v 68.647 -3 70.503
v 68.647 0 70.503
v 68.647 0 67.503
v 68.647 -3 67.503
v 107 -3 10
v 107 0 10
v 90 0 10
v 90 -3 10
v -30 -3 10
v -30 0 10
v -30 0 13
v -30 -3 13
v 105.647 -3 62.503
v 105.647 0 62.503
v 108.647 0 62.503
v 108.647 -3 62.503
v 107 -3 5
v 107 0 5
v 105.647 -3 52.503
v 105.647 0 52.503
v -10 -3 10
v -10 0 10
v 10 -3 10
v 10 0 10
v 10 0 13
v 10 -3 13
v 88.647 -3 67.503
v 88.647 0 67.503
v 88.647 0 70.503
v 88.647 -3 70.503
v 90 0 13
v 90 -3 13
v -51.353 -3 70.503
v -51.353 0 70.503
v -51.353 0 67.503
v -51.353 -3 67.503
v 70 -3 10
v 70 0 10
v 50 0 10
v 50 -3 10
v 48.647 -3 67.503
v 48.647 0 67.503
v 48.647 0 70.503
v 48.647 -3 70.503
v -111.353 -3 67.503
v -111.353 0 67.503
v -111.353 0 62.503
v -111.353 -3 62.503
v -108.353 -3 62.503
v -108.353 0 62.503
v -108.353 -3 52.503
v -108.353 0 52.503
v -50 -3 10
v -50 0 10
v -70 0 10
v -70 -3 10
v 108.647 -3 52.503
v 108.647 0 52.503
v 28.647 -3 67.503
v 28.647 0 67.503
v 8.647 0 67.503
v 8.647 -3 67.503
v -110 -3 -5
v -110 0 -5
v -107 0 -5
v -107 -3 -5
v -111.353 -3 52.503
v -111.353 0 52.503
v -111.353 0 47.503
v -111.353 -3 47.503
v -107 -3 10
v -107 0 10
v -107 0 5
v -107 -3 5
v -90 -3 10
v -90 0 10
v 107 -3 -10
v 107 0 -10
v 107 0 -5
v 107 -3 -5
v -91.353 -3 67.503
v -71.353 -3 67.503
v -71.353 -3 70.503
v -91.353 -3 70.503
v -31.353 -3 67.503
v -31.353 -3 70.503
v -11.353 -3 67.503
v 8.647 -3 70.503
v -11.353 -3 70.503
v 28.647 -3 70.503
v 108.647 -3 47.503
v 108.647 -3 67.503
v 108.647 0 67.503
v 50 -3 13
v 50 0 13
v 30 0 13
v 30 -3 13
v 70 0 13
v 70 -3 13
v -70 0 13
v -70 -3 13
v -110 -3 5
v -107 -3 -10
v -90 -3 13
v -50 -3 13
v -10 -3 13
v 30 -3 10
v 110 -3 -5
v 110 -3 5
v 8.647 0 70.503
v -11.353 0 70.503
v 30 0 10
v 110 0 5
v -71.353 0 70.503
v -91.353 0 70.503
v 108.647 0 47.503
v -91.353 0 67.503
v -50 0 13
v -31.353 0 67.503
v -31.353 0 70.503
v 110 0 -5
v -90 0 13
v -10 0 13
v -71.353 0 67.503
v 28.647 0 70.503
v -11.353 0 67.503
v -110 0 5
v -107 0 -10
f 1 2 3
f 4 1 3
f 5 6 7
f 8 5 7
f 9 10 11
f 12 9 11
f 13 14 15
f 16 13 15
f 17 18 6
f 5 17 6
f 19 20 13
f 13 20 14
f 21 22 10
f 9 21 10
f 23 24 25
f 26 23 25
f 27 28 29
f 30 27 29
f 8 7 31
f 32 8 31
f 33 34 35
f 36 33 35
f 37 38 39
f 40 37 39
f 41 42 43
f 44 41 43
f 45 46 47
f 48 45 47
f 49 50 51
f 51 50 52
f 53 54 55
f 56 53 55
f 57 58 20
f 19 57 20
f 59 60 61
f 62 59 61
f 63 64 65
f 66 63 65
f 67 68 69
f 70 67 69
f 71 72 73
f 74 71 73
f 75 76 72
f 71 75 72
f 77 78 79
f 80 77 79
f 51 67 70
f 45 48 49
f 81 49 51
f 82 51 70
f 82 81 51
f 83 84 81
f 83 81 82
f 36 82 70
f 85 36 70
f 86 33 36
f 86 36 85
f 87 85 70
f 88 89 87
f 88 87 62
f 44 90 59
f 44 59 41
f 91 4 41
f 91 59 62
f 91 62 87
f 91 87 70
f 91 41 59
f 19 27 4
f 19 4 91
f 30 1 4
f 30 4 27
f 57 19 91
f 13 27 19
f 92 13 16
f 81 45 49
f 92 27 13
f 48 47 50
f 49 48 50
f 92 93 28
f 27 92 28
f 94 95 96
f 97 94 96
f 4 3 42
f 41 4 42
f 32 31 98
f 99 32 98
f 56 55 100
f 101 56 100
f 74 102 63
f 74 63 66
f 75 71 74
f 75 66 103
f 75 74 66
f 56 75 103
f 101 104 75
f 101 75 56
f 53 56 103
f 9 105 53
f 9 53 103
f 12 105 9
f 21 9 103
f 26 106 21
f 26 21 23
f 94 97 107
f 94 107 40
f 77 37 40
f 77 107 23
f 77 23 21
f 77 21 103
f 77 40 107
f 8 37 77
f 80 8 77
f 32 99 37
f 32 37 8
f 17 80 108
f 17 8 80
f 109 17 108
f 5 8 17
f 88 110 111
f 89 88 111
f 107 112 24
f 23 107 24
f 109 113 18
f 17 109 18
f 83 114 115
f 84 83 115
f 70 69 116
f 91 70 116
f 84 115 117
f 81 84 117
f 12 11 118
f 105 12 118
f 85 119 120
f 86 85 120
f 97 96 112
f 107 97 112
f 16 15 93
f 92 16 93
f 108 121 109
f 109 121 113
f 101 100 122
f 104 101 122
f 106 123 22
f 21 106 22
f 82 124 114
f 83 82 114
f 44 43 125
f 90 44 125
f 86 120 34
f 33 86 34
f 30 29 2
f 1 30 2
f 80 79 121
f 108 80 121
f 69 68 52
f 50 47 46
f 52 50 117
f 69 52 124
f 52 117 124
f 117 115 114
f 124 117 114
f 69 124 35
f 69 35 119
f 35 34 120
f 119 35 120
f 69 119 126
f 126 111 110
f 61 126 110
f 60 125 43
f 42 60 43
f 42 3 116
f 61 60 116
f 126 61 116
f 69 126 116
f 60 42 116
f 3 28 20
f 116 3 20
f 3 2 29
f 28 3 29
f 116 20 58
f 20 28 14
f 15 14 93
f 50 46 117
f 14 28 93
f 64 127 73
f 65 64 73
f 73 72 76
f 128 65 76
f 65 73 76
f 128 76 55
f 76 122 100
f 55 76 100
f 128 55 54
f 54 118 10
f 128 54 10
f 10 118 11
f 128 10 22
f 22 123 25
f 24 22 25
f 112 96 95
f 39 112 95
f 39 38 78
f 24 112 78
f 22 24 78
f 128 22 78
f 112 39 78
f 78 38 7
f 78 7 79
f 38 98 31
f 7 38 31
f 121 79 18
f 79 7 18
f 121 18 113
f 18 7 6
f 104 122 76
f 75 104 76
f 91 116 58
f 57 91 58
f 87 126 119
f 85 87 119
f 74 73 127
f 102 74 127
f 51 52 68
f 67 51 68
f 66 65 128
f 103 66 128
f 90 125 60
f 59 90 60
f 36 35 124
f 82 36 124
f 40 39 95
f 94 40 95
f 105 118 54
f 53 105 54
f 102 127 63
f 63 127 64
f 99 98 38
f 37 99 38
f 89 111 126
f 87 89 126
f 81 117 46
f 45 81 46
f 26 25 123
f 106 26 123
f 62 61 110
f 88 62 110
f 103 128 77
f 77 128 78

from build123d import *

# Parameters (mm, degrees)
F1_DEPTH = 3


with BuildPart() as f1:
    # F0 (on Front) → F1 (new body)
    with BuildSketch(Plane.XZ):
        Polygon((-91.353428, 67.502585), (-111.353428, 67.502585), (-111.353428, 62.502585), (-108.353428, 62.502585), (-108.353428, 52.502585), (-111.353428, 52.502585), (-111.353428, 47.502585), (108.646572, 47.502585), (108.646572, 52.502585), (105.646572, 52.502585), (105.646572, 62.502585), (108.646572, 62.502585), (108.646572, 67.502585), (88.646572, 67.502585), (88.646572, 70.502585), (68.646572, 70.502585), (68.646572, 67.502585), (48.646572, 67.502585), (48.646572, 70.502585), (28.646572, 70.502585), (28.646572, 67.502585), (8.646572, 67.502585), (8.646572, 70.502585), (-11.353428, 70.502585), (-11.353428, 67.502585), (-31.353428, 67.502585), (-31.353428, 70.502585), (-51.353428, 70.502585), (-51.353428, 67.502585), (-71.353428, 67.502585), (-71.353428, 70.502585), (-91.353428, 70.502585), align=None)
        Polygon((-90, 10), (-107, 10), (-107, 5), (-110, 5), (-110, -5), (-107, -5), (-107, -10), (107, -10), (107, -5), (110, -5), (110, 5), (107, 5), (107, 10), (90, 10), (90, 13), (70, 13), (70, 10), (50, 10), (50, 13), (30, 13), (30, 10), (10, 10), (10, 13), (-10, 13), (-10, 10), (-30, 10), (-30, 13), (-50, 13), (-50, 10), (-70, 10), (-70, 13), (-90, 13), align=None)
    extrude(amount=F1_DEPTH)


solid = f1.part
